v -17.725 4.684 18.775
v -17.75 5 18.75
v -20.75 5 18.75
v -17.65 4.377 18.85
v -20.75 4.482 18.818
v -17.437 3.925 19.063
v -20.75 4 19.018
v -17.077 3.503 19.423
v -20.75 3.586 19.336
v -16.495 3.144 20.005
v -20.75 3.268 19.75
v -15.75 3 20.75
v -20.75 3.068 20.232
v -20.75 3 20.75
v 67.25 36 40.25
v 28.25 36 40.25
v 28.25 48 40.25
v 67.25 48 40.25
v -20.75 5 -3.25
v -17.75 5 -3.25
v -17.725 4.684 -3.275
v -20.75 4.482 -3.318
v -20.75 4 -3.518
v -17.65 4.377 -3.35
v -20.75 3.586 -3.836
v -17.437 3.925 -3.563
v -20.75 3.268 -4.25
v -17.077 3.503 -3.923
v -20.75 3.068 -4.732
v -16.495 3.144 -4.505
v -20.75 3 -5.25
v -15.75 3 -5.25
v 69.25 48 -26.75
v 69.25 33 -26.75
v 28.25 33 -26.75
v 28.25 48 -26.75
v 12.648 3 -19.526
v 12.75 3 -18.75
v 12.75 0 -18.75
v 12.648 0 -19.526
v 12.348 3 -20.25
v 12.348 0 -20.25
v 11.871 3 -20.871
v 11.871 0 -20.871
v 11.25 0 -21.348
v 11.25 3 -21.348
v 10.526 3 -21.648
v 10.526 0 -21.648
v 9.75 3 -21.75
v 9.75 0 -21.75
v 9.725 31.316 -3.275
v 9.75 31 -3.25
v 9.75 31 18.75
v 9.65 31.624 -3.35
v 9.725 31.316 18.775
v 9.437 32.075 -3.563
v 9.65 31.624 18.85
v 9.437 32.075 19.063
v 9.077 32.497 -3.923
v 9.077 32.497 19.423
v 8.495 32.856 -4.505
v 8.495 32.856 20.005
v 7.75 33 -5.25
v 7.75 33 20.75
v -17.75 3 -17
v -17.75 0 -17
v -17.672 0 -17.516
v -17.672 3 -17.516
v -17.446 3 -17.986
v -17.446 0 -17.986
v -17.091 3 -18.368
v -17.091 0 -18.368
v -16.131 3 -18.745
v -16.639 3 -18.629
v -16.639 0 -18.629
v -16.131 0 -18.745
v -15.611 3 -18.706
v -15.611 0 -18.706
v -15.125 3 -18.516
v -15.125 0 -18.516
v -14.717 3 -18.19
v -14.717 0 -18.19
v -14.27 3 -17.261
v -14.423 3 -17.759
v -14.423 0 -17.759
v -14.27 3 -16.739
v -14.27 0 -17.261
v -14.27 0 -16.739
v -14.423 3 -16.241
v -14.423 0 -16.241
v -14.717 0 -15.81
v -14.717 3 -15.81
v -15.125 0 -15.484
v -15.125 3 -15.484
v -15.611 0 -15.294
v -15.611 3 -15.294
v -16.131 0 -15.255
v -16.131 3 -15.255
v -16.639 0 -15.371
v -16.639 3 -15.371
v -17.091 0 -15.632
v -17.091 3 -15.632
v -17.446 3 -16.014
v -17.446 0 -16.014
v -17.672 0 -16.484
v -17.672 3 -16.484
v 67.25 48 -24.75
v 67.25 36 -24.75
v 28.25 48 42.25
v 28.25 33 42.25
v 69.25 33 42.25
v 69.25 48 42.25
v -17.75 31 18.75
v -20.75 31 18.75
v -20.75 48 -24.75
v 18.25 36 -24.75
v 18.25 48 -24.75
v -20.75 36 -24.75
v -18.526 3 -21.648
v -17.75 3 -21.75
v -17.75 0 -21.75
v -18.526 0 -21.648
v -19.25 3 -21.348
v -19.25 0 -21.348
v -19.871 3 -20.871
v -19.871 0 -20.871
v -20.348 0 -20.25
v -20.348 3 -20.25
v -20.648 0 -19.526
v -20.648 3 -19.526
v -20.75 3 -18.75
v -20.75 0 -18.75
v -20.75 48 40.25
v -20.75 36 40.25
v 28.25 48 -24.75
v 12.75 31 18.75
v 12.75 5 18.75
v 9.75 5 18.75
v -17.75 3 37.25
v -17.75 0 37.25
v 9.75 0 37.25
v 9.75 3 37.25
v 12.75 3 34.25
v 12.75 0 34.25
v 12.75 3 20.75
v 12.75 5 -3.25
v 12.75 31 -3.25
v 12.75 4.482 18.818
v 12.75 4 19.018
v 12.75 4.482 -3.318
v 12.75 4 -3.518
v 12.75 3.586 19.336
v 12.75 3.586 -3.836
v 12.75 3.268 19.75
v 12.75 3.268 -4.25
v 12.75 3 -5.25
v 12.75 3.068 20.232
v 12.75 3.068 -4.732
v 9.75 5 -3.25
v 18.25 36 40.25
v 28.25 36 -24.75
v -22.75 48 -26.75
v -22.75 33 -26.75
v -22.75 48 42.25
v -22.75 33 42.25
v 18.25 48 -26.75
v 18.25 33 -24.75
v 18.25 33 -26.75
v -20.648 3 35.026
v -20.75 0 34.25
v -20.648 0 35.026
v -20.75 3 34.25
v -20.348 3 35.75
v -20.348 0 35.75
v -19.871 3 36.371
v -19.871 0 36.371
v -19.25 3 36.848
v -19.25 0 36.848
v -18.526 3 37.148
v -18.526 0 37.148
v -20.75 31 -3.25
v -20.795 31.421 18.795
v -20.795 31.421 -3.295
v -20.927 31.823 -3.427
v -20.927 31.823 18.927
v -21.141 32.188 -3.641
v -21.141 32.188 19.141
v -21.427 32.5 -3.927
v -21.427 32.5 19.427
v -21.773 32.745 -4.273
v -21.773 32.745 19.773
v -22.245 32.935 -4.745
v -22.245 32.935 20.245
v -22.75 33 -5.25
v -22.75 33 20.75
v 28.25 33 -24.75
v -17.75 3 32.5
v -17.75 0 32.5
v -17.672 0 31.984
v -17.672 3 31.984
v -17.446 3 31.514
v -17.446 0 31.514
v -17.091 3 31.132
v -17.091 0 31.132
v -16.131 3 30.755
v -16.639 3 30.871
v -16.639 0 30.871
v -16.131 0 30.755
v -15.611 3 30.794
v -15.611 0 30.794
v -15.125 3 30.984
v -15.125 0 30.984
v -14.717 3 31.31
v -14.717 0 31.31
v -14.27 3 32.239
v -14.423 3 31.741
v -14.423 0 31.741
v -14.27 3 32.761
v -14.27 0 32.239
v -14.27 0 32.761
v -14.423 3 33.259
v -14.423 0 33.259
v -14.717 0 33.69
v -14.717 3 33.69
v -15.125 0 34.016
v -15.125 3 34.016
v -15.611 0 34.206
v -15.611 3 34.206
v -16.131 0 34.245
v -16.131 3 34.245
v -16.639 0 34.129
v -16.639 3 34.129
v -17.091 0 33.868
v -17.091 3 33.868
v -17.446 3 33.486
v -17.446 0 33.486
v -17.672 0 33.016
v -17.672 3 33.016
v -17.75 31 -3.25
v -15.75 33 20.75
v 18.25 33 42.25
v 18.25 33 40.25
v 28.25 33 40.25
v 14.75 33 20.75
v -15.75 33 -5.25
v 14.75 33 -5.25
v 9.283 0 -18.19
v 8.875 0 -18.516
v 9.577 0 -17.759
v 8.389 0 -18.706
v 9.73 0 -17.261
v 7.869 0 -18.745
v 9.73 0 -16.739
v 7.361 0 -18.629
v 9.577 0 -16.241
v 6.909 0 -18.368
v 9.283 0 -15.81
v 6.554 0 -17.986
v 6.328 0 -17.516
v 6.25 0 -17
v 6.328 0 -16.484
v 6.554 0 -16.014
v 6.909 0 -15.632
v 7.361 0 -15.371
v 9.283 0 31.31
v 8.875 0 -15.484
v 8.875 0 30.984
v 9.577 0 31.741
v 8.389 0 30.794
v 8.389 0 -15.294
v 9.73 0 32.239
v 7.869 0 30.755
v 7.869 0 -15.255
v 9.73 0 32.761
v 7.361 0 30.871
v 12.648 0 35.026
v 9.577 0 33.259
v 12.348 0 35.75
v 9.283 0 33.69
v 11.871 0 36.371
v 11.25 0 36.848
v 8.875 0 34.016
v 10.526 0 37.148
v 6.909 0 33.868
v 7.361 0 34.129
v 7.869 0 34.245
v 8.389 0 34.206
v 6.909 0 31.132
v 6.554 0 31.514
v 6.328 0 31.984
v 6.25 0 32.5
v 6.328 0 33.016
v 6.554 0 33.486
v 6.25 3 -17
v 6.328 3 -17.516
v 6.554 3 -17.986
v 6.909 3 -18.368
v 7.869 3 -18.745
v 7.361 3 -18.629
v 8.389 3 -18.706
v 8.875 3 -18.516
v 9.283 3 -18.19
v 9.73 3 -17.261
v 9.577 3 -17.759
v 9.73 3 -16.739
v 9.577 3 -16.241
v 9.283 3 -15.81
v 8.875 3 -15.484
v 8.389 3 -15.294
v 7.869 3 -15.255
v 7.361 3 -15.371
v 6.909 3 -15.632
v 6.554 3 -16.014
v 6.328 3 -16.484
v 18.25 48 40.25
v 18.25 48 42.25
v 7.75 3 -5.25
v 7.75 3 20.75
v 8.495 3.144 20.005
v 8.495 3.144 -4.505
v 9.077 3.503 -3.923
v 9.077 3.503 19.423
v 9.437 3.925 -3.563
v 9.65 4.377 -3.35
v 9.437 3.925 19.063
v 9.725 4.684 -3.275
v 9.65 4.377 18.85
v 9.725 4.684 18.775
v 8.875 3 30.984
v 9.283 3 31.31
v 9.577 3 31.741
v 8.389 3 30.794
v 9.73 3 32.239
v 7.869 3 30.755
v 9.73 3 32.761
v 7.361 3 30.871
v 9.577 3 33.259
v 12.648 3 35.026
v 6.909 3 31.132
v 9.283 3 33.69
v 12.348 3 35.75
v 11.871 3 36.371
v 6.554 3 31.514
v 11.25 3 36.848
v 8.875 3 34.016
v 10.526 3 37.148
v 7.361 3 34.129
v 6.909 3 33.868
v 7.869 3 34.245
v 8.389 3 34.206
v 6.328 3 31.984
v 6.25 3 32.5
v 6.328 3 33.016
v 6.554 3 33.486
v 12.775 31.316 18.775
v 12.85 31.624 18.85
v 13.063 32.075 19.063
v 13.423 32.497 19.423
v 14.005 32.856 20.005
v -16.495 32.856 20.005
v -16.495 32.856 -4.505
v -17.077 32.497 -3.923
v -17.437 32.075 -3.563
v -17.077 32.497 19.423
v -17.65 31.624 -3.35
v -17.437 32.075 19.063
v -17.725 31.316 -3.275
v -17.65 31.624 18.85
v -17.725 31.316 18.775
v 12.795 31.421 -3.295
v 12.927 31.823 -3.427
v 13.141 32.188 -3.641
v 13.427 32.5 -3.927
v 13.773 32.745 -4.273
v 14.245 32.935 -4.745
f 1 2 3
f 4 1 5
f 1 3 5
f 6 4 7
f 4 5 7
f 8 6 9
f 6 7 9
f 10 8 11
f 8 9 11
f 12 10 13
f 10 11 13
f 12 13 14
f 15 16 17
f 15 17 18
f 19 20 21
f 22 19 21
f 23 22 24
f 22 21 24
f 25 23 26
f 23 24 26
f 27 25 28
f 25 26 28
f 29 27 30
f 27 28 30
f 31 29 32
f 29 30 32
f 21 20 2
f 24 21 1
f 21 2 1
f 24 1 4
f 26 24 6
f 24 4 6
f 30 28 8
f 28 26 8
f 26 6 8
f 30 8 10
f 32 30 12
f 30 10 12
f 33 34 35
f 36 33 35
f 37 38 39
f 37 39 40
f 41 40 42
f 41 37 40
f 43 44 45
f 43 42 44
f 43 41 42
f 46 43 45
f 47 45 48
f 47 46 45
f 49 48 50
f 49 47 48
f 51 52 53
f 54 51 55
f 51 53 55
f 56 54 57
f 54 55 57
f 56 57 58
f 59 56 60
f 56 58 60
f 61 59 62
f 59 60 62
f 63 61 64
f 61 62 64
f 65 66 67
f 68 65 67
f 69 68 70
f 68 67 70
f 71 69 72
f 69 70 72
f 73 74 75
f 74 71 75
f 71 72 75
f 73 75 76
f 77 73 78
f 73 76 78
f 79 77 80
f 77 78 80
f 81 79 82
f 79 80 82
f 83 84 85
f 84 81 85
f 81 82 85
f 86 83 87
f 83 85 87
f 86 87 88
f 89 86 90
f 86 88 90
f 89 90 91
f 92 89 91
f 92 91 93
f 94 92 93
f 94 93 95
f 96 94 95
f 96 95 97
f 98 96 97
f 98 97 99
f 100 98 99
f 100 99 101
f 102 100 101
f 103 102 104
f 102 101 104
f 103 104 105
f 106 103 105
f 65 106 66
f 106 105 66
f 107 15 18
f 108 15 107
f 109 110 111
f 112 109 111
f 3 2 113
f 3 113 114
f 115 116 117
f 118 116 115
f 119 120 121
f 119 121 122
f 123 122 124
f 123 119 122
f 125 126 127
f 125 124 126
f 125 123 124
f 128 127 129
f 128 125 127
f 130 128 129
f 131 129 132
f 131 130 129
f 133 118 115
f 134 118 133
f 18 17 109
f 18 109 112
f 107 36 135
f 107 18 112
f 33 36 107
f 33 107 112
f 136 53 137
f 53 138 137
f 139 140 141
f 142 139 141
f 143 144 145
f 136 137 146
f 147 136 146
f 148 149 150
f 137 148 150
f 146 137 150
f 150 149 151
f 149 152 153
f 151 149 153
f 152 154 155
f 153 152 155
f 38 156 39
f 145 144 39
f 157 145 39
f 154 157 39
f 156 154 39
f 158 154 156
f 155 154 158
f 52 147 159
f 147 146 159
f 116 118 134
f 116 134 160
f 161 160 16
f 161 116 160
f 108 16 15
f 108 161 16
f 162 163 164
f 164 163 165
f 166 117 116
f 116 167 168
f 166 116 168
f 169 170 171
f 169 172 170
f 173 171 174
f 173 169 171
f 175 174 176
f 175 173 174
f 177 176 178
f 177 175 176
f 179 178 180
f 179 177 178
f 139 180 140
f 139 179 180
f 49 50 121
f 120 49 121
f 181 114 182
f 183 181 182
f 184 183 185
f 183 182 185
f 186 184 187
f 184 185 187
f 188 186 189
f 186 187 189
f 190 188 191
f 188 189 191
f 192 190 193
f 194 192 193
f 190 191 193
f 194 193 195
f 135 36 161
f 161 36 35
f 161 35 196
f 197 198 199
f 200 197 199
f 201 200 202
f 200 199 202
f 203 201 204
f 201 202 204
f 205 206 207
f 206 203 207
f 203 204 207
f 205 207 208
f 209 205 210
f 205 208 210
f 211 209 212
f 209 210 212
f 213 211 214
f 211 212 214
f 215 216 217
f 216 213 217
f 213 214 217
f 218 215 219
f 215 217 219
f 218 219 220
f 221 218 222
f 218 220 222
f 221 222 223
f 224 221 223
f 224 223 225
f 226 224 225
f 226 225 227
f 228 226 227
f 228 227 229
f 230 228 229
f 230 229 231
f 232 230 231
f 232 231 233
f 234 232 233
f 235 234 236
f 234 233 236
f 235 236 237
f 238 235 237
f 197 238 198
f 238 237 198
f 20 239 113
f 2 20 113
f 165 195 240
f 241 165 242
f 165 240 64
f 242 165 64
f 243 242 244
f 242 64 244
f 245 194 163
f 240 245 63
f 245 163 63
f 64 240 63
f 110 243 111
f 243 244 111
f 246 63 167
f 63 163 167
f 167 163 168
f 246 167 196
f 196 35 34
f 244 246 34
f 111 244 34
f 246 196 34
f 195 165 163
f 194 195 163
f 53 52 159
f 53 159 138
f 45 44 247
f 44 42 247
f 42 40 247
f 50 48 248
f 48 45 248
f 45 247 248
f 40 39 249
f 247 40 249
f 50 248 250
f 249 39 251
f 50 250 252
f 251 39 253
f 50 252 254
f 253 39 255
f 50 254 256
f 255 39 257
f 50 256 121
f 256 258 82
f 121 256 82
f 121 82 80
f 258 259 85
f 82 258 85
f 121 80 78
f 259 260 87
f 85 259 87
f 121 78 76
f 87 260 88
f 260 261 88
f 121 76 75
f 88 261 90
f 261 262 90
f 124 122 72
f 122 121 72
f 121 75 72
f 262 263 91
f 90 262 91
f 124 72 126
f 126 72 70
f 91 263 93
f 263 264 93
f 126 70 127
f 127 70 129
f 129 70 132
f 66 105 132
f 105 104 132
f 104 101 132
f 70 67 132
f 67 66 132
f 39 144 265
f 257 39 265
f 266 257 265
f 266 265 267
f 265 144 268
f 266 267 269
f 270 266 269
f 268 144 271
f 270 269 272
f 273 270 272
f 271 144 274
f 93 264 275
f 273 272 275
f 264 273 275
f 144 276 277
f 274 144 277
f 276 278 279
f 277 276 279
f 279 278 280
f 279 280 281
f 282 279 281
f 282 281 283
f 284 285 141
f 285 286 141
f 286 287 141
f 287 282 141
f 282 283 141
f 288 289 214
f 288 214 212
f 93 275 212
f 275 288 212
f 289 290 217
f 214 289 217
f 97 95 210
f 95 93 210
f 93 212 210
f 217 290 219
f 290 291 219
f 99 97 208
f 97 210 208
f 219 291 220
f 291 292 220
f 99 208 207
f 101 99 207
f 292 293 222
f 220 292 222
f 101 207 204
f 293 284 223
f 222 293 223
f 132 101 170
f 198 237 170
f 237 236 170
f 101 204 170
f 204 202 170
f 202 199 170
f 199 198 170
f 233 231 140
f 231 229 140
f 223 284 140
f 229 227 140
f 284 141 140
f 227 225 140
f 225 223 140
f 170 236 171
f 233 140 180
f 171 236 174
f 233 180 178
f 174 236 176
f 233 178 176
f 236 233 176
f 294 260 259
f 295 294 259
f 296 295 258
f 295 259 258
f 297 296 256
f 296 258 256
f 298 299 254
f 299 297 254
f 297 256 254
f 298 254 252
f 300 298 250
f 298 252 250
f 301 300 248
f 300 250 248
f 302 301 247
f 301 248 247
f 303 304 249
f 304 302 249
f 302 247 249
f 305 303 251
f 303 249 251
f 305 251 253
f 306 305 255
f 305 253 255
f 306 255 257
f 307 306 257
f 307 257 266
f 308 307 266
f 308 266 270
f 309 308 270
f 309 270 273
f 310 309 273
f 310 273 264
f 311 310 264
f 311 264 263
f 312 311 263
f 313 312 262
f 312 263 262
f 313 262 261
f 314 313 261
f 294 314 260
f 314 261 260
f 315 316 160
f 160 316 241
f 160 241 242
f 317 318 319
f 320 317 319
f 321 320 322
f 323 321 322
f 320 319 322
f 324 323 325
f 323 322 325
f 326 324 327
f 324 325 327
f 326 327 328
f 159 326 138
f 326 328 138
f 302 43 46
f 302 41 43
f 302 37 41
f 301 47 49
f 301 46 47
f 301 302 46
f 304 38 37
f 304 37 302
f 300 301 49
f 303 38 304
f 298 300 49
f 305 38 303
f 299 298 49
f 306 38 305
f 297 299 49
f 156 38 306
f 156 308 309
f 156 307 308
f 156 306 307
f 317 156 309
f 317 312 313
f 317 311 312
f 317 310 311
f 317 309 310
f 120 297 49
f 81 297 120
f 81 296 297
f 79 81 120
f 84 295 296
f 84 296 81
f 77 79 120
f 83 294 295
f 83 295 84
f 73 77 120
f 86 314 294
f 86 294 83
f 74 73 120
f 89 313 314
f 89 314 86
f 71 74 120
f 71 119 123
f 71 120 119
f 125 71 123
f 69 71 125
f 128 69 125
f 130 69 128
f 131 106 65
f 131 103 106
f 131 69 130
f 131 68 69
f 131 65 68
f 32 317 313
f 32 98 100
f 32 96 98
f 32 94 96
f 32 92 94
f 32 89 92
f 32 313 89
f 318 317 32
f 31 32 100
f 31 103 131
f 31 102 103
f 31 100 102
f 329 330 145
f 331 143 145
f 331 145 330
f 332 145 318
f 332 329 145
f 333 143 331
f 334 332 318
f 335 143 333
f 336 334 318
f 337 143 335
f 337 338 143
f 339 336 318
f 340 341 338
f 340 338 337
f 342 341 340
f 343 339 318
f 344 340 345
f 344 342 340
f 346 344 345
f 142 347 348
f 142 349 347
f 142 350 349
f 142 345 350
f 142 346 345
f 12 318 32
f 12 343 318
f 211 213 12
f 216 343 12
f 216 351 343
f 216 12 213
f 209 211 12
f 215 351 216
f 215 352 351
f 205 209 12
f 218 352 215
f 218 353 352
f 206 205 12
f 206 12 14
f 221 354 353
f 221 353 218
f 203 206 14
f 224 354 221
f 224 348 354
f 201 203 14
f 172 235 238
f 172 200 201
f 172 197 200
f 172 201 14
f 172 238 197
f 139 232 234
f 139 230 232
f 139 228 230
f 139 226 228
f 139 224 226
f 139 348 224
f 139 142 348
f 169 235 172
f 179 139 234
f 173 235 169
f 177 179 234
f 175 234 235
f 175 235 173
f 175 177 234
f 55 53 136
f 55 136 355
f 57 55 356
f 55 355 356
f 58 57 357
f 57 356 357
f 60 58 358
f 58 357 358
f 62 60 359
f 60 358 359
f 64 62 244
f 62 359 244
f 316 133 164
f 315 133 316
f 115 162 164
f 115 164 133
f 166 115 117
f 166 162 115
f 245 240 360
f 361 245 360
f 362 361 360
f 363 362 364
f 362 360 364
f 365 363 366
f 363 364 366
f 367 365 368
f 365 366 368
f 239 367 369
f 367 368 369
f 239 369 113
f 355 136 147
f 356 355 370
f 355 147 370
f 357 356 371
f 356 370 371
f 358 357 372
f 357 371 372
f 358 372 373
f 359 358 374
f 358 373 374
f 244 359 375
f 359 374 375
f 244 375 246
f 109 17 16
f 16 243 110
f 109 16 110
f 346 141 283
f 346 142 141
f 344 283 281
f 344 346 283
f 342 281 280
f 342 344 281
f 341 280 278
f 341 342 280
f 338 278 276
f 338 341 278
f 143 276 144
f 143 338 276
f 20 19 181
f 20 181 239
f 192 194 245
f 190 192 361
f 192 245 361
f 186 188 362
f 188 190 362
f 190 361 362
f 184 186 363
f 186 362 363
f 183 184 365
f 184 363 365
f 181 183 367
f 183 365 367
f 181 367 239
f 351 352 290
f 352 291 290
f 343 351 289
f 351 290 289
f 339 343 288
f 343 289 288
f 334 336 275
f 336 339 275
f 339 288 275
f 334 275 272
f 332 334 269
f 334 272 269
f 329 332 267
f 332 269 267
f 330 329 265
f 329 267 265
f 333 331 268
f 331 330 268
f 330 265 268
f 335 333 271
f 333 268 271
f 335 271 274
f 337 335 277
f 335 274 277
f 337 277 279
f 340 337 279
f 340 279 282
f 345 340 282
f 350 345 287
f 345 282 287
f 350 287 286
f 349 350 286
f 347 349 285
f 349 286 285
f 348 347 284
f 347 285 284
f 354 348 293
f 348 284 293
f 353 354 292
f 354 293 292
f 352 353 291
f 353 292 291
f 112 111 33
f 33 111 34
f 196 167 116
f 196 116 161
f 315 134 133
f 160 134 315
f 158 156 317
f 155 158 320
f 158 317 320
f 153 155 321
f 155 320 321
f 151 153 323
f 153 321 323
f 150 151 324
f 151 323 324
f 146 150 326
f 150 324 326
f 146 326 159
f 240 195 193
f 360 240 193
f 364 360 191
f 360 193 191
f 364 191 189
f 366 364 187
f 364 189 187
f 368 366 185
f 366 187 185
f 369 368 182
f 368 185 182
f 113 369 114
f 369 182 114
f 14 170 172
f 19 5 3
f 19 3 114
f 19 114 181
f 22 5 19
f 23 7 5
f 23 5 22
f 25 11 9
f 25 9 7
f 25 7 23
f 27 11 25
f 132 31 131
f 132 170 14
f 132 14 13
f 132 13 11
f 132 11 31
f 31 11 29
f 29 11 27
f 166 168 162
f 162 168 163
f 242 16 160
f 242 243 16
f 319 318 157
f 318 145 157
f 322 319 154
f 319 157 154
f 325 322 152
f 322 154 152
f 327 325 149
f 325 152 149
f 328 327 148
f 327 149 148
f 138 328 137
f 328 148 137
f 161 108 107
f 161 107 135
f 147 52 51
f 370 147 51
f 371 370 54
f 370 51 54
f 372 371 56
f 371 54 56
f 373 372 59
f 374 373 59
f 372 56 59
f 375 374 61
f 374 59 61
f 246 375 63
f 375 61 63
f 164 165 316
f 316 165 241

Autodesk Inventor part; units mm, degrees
ref_plane "YZ Plane" through (0, 0, 0) normal (1, 0, 0) x (0, 1, 0)
ref_plane "XZ Plane" through (0, 0, 0) normal (0, 1, 0) x (-1, 0, 0)
ref_plane "XY Plane" through (0, 0, 0) normal (0, 0, 1) x (1, 0, 0)
sketch "Эскиз1" plane through (0, 0, 0) normal (0, 1, 0) x (-1, 0, 0)
  circle A0 centre (16, 32.5) radius 1.75
  circle A1 centre (16, -17) radius 1.75
  circle A2 centre (-8, -17) radius 1.75
  circle A3 centre (-8, 32.5) radius 1.75
  line L0 (20.75, 37.25) -> (-12.75, 37.25)
  line L1 (-12.75, 37.25) -> (-12.75, -21.75)
  line L2 (-12.75, -21.75) -> (20.75, -21.75)
  line L3 (20.75, -21.75) -> (20.75, 37.25)
  point P0 (0, 0)
  dimension "d0" = 3.5
  dimension "d1" = 3.5
  dimension "d2" = 46
  dimension "d3" = 3.5
  dimension "d4" = 20.5
  dimension "d5" = 3.5
  dimension "d6" = 46
  dimension "d8" = 20.5
  dimension "d9" = 3
  dimension "d10" = 3
  dimension "d11" = 3
  dimension "d12" = 3
  dimension "d13" = 3
  dimension "d14" = 3
  dimension "d15" = 59
  dimension "d16" = 3
  dimension "d17" = 4.75
extrude "Выдавливание1" add sketch "Эскиз1" along normal blind 3
sketch "Эскиз2" plane through (0, 3, 0) normal (0, 1, 0) x (1, 0, 0)
  line L0 (-20.75, 21.75) -> (-20.75, -37.25) projected
  line L1 (-20.75, 3.25) -> (-17.75, 3.25)
  line L2 (-17.75, 3.25) -> (-17.75, -18.75)
  line L3 (-17.75, -18.75) -> (-20.75, -18.75)
  line L4 (-20.75, -18.75) -> (-20.75, 3.25)
  line L5 (12.75, -37.25) -> (12.75, 21.75) projected
  line L6 (12.75, 3.25) -> (9.75, 3.25)
  line L7 (9.75, 3.25) -> (9.75, -18.75)
  line L8 (9.75, -18.75) -> (12.75, -18.75)
  line L9 (12.75, -18.75) -> (12.75, 3.25)
  line L10 (12.75, 21.75) -> (-20.75, 21.75) projected
  line L11 (-20.75, -37.25) -> (12.75, -37.25) projected
  point P0 (0, 0)
  dimension "d20" = 59
  dimension "d21" = 3
  dimension "d22" = 3
  dimension "d23" = 22
  dimension "d24" = 22
  dimension "d25" = 18.5
  dimension "d26" = 18.5
  dimension "d27" = 18.5
extrude "Выдавливание2" add sketch "Эскиз2" along normal blind 30 contours L1 L2 L3 L0 | L5 L8 L7 L6
sketch "Эскиз3" plane through (0, 33, 0) normal (0, 1, 0) x (1, 0, 0)
  line L0 (-20.75, 21.75) -> (-20.75, 3.25) projected
  line L1 (-20.75, 24.75) -> (67.25, 24.75)
  line L2 (67.25, 24.75) -> (67.25, -40.25)
  line L3 (67.25, -40.25) -> (-20.75, -40.25)
  line L4 (-20.75, -40.25) -> (-20.75, 24.75)
  line L5 (12.75, 21.75) -> (-20.75, 21.75) projected
  line L6 (-20.75, -37.25) -> (12.75, -37.25) projected
  line L7 (69.25, 26.75) -> (-22.75, 26.75)
  line L8 (-22.75, 26.75) -> (-22.75, -42.25)
  line L9 (-22.75, -42.25) -> (69.25, -42.25)
  line L10 (69.25, -42.25) -> (69.25, 26.75)
  point P0 (0, 0)
  dimension "d30" = 88
  dimension "d31" = 65
  dimension "d34" = 59
  dimension "d35" = 88
  dimension "d38" = 3
  dimension "d39" = 2
  dimension "d40" = 2
  dimension "d41" = 2
  dimension "d42" = 2
extrude "Выдавливание3" add sketch "Эскиз3" along normal blind 3 contours L4 L1 L2 L3 L0
sketch "Эскиз4" plane through (0, 36, 0) normal (0, 1, 0) x (1, 0, 0)
  line L0 (67.25, 24.75) -> (-20.75, 24.75) projected
  line L1 (67.25, 24.75) -> (-20.75, 24.75)
  line L2 (-20.75, 24.75) -> (-20.75, -40.25)
  line L3 (-20.75, -40.25) -> (67.25, -40.25)
  line L4 (67.25, -40.25) -> (67.25, 24.75)
  line L5 (69.25, 26.75) -> (-22.75, 26.75)
  line L6 (-22.75, 26.75) -> (-22.75, -42.25)
  line L7 (-22.75, -42.25) -> (69.25, -42.25)
  line L8 (69.25, -42.25) -> (69.25, 26.75)
  line L9 (33.25, 26.75) -> (23.25, 26.75)
  line L10 (23.25, 24.75) -> (33.25, 24.75)
  line L11 (67.25, -40.25) -> (-20.75, -40.25) projected
  line L12 (30, -42.25) -> (40, -42.25)
  line L13 (40, -40.25) -> (30, -40.25)
  line L14 (28.25, 24.75) -> (18.25, 24.75)
  line L15 (18.25, 24.75) -> (18.25, 26.75)
  line L16 (18.25, 26.75) -> (28.25, 26.75)
  line L17 (28.25, 26.75) -> (28.25, 24.75)
  line L18 (18.25, -40.25) -> (28.25, -40.25)
  line L19 (28.25, -40.25) -> (28.25, -42.25)
  line L20 (28.25, -42.25) -> (18.25, -42.25)
  line L21 (18.25, -42.25) -> (18.25, -40.25)
  point P0 (0, 0)
  dimension "d43" = 2
  dimension "d44" = 2
  dimension "d45" = 2
  dimension "d46" = 2
  dimension "d51" = 10
  dimension "d52" = 41
  dimension "d53" = 41
  dimension "d54" = 10
  dimension "d55" = 41
extrude "Выдавливание4" add sketch "Эскиз4" along normal blind 12 and the other way blind 3 contours L0 L17 L5 L8 L7 L19 L3 L4 | L0 L2 L3 L21 L7 L6 L5 L15
fillet "Сопряжение1" radius 2 3 edges at (9.75, 3, 7.75) (11.25, 3, 18.75) (11.25, 3, -3.25)
fillet "Сопряжение2" radius 2 3 edges at (-19.25, 3, -3.25) (-17.75, 3, 7.75) (-19.25, 3, 18.75)
fillet "Сопряжение3" radius 2 8 edges at (11.25, 33, 18.75) (12.75, 33, 7.75) (-17.75, 33, 7.75) (-19.25, 33, 18.75) (-20.75, 33, 7.75) (-19.25, 33, -3.25) (9.75, 33, 7.75) (11.25, 33, -3.25)
fillet "Сопряжение4" radius 3 4 edges at (-20.75, 1.5, 37.25) (12.75, 1.5, 37.25) (-20.75, 1.5, -21.75) (12.75, 1.5, -21.75)
properties part number "батарейки"
